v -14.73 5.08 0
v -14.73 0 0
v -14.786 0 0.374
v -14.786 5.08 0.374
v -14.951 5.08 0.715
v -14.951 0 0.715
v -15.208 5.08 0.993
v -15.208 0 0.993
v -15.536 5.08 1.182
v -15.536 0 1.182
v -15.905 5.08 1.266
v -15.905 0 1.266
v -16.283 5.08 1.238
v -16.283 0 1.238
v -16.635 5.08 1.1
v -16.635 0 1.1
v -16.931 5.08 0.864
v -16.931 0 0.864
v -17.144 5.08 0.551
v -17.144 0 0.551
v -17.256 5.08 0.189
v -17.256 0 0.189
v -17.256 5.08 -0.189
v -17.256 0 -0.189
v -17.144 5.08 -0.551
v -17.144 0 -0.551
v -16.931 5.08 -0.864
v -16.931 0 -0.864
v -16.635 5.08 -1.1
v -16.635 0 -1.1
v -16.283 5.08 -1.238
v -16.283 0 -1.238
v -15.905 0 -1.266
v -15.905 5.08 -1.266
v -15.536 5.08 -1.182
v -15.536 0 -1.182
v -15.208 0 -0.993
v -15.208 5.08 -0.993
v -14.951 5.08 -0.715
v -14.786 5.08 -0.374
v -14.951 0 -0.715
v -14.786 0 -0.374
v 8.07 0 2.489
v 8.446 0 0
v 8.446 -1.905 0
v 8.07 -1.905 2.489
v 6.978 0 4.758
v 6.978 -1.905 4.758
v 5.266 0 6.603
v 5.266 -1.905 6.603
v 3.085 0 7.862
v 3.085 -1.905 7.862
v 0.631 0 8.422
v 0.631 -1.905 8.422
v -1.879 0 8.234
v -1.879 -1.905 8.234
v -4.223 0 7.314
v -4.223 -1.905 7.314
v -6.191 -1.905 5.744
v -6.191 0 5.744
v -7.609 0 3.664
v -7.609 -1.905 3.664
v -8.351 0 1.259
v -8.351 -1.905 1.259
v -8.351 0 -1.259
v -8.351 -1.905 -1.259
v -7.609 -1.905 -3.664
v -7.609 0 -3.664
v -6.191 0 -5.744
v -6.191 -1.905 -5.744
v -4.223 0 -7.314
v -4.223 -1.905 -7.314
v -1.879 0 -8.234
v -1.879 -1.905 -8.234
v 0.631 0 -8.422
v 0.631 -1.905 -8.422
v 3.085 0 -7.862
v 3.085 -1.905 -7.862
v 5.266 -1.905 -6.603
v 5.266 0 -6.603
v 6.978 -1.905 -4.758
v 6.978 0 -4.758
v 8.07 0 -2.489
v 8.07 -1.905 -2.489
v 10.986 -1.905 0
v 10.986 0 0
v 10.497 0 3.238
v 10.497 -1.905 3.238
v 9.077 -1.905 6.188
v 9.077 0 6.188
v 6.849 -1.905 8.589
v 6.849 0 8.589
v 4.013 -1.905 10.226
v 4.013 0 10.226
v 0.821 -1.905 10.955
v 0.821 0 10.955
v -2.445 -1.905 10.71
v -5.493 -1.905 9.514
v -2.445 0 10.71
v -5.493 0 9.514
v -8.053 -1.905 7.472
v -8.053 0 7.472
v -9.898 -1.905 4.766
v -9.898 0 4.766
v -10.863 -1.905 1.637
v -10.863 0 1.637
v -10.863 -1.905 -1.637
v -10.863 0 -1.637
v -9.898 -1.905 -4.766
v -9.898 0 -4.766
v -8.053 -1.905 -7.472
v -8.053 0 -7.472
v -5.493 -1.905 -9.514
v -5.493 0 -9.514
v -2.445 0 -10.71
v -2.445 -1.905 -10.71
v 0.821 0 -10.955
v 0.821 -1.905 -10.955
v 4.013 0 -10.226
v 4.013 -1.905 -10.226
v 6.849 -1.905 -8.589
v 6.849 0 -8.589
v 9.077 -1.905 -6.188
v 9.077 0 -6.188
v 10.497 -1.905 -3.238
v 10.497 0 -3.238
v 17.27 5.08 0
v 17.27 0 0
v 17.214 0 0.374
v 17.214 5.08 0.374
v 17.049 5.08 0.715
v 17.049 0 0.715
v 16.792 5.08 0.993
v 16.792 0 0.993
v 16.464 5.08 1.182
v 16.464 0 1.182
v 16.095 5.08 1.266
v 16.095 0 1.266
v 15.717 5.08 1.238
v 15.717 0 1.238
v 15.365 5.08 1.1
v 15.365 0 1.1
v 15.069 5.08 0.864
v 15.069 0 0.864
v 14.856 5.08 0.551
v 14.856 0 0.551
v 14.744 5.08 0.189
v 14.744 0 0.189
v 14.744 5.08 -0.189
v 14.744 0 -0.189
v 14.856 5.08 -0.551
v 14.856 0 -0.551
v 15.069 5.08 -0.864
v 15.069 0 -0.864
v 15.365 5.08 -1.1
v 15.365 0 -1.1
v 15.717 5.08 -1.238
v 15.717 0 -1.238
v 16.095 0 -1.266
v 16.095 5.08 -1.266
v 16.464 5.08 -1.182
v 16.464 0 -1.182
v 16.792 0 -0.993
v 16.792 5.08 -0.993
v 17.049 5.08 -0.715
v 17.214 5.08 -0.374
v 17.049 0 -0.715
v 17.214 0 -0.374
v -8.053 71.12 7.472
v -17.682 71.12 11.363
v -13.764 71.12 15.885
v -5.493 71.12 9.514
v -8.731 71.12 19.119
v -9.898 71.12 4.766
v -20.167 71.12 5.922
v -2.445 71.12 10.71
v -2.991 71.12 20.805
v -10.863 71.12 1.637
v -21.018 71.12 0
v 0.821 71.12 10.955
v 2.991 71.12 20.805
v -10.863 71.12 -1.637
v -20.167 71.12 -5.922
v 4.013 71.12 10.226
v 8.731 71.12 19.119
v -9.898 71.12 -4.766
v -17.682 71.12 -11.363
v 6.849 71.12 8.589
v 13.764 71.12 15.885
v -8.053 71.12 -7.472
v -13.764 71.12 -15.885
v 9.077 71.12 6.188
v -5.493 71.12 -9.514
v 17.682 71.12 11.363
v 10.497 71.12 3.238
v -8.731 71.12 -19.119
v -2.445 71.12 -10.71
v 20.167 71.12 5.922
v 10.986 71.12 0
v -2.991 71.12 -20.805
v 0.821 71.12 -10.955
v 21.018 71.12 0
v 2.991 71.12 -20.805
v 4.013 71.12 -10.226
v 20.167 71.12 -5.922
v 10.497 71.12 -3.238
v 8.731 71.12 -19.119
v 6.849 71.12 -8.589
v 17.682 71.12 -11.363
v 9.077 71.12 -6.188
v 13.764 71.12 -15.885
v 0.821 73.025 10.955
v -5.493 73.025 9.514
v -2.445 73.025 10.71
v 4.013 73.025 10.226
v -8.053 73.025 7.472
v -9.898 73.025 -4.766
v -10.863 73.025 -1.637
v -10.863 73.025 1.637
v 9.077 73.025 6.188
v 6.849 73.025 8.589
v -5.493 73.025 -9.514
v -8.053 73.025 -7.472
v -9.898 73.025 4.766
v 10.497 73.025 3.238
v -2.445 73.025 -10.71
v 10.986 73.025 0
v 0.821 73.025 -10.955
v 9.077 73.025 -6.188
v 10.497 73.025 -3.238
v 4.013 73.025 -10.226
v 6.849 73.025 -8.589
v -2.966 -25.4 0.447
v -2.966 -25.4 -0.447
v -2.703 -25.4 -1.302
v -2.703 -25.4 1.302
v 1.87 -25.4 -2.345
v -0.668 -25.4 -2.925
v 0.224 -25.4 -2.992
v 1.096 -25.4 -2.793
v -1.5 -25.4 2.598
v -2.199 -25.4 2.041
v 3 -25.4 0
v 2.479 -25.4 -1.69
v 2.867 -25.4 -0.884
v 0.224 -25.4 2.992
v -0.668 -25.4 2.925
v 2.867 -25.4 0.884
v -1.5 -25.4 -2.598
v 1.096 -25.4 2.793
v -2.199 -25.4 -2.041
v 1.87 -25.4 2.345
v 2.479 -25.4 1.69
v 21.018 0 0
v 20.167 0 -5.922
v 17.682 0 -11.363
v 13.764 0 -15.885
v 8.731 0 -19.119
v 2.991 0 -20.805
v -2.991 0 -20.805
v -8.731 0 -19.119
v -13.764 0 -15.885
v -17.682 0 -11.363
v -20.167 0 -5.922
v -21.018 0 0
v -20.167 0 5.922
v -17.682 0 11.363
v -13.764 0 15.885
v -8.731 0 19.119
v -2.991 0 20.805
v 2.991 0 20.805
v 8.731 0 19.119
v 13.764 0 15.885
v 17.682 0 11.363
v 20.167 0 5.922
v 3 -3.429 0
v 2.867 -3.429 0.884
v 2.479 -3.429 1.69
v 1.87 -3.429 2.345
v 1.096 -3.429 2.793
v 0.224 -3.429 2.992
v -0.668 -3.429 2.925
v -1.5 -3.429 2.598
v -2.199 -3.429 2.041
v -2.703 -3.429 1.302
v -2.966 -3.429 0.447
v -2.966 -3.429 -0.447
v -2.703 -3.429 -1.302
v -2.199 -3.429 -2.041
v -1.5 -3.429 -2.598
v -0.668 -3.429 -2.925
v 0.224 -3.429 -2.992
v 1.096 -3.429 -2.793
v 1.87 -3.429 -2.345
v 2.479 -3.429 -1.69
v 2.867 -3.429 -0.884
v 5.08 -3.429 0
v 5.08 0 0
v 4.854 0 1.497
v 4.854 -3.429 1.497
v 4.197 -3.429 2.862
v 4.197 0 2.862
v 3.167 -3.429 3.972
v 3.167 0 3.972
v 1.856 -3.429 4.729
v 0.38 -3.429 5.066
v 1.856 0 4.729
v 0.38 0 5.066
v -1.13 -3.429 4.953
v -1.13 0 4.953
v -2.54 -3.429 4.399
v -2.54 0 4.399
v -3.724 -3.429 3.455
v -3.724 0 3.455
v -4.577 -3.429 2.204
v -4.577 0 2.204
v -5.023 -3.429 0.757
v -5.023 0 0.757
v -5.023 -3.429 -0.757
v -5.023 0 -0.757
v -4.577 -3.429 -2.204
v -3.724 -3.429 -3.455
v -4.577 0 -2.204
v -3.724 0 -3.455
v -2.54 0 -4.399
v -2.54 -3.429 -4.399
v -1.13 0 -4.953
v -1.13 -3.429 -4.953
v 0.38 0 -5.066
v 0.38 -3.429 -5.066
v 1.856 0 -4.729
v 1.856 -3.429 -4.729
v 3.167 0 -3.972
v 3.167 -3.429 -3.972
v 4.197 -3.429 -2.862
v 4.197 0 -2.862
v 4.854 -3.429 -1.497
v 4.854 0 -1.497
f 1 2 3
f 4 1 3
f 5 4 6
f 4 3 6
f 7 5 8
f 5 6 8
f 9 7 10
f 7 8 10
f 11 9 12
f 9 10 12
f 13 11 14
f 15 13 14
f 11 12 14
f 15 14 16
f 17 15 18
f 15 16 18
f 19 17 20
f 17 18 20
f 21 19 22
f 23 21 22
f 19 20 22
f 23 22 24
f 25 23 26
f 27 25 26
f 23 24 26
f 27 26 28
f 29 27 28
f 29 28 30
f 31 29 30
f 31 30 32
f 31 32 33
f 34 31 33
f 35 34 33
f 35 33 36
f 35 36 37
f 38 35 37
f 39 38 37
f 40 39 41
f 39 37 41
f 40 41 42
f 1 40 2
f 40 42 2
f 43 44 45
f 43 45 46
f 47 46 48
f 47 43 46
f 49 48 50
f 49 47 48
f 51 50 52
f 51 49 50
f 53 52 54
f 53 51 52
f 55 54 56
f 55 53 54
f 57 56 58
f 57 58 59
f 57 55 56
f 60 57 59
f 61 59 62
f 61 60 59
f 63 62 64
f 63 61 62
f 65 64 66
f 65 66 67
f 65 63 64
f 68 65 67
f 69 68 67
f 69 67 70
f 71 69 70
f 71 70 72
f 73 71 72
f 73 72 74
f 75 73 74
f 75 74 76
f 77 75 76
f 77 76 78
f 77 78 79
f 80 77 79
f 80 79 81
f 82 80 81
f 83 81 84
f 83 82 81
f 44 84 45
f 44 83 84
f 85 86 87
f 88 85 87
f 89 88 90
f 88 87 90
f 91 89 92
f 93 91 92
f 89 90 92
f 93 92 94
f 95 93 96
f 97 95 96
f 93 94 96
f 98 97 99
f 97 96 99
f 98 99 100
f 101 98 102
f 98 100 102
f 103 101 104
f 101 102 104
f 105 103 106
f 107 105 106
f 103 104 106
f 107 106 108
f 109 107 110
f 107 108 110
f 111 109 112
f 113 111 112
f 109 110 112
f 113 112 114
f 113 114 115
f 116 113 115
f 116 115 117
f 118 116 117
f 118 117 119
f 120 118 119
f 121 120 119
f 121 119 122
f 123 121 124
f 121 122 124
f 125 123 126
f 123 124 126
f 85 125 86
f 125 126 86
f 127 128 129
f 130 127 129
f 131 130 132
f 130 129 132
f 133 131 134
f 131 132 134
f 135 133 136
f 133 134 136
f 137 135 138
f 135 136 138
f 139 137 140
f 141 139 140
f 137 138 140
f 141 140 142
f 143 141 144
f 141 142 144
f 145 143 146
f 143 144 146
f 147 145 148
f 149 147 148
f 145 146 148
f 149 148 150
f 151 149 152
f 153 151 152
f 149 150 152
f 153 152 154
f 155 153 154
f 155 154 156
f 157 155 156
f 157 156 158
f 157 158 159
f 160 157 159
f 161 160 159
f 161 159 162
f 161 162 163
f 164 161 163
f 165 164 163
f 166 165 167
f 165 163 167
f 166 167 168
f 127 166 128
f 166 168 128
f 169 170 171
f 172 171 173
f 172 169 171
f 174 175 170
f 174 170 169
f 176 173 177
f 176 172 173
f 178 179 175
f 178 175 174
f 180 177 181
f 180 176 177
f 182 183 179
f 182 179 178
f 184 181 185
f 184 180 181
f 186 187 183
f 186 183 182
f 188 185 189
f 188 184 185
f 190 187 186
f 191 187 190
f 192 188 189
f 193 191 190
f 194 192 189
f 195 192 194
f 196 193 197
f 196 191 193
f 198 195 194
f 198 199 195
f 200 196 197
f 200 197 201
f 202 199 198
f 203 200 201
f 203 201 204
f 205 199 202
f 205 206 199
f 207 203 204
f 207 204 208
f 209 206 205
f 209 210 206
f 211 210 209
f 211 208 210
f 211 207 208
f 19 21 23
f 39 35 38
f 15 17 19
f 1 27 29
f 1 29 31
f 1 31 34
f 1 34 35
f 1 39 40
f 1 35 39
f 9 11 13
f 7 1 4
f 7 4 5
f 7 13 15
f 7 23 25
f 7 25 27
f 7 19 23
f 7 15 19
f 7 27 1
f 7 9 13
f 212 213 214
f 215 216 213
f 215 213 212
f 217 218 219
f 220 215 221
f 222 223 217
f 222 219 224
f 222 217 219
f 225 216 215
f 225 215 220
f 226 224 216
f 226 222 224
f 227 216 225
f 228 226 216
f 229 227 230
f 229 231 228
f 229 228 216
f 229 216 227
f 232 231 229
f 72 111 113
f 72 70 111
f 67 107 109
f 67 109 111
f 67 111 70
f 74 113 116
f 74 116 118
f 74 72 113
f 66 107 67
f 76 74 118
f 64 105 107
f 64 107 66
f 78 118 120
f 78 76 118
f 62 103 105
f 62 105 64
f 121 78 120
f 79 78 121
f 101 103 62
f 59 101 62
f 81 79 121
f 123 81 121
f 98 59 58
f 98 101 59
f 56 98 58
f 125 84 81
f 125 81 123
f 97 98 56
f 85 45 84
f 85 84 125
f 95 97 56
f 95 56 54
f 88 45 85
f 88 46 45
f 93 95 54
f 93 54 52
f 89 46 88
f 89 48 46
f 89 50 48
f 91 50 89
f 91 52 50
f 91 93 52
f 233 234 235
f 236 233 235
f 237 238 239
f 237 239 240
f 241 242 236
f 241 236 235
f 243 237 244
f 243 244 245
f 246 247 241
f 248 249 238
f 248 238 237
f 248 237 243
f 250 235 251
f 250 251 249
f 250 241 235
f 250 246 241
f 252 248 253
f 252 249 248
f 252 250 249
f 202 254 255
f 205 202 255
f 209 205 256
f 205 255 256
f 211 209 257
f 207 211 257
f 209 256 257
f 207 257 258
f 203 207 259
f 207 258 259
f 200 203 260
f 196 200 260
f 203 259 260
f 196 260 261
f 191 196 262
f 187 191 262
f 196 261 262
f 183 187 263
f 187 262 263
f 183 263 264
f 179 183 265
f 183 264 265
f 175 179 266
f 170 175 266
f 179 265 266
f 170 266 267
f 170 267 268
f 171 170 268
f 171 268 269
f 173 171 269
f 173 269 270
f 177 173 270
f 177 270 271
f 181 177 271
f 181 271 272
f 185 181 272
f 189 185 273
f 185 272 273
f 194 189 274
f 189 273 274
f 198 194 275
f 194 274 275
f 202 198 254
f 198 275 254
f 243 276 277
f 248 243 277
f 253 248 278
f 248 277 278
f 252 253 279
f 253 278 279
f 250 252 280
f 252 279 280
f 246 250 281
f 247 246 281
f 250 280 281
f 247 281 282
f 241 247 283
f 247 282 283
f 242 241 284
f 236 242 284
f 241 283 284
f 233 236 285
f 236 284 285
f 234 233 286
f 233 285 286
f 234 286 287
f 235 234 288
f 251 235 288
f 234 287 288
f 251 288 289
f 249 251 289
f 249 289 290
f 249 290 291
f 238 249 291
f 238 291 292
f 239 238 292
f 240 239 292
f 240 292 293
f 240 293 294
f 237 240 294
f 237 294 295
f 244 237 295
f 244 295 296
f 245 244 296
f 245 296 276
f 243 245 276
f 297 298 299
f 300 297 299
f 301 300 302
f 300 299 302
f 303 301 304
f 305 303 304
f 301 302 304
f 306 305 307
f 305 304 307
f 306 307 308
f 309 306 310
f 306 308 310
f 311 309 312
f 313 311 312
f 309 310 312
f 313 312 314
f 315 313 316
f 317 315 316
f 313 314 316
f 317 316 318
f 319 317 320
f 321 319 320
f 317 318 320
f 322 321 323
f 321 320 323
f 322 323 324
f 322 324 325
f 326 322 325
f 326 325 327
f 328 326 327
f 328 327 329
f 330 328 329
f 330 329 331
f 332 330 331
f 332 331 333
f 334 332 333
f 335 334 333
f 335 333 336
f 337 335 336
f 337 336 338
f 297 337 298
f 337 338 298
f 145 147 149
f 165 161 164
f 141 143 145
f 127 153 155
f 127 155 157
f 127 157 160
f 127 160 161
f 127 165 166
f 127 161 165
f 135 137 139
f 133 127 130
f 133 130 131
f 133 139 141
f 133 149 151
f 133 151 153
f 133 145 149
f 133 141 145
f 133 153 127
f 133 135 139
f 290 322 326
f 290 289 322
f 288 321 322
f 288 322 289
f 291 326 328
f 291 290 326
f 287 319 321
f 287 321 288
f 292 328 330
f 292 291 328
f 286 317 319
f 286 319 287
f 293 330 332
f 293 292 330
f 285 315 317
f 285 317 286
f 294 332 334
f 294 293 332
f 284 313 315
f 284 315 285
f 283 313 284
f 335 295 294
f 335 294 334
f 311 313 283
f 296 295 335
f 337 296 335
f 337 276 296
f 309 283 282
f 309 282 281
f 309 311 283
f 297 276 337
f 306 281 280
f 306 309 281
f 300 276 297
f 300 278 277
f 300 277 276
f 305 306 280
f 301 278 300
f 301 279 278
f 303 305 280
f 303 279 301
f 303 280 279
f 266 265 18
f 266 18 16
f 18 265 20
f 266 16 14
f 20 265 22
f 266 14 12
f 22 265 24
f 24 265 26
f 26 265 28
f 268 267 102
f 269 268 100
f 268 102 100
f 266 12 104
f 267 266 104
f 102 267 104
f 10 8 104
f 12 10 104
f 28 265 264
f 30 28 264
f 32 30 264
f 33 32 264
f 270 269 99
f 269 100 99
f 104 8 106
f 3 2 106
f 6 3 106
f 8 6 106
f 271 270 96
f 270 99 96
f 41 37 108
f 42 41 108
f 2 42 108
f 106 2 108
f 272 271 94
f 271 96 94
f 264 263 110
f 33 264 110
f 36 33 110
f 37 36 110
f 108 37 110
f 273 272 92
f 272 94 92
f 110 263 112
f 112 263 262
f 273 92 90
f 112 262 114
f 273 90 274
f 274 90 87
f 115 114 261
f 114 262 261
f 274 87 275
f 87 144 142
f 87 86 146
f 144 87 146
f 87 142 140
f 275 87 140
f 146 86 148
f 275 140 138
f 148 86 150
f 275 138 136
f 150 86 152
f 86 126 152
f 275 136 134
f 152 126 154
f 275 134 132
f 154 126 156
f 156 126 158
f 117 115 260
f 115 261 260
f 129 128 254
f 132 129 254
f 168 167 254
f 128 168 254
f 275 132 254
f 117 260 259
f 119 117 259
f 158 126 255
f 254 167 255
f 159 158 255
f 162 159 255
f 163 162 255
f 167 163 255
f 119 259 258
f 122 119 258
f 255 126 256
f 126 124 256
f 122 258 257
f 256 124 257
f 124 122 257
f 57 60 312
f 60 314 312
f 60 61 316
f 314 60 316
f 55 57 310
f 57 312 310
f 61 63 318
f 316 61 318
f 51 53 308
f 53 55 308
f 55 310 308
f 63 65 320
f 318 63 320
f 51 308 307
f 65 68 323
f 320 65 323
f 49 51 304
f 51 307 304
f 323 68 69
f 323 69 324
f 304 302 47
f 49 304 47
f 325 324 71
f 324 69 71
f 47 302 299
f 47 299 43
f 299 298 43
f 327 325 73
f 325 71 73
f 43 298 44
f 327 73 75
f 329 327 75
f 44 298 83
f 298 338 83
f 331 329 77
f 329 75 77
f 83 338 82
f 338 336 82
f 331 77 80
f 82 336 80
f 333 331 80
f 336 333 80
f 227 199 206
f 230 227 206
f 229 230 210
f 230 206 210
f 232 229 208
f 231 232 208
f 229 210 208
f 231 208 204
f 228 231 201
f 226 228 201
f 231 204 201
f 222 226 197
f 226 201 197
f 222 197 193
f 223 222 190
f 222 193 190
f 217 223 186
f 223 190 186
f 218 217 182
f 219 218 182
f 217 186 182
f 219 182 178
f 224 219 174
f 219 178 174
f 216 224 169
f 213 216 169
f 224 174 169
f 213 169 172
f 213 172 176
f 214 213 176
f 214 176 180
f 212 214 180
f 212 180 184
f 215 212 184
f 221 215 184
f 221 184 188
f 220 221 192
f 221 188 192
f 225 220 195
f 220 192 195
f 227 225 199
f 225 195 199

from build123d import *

# Parameters (mm, degrees)
SKETCH2_R           = 21.0185
BOSS_EXTRUDE1_DEPTH = 71.12
SKETCH3_R           = 10.9855
BOSS_EXTRUDE2_DEPTH = 1.905
SKETCH4_R           = 10.9855
SKETCH4_R_2         = 8.4455
BOSS_EXTRUDE3_DEPTH = 1.905
SKETCH5_R           = 3
BOSS_EXTRUDE4_DEPTH = 25.4
SKETCH6_R           = 5.08
BOSS_EXTRUDE5_DEPTH = 3.429
SKETCH7_R           = 1.27
CUT_EXTRUDE1_DEPTH  = 5.08


with BuildPart() as part:
    # Sketch2 → Boss-Extrude1 (new body)
    with BuildSketch(Plane(origin=(0, 0, 0), x_dir=(1, 0, 0), z_dir=(0, 1, 0))):
        Circle(SKETCH2_R)
    extrude(amount=BOSS_EXTRUDE1_DEPTH)

    # Sketch3 → Boss-Extrude2 (add)
    with BuildSketch(Plane(origin=(0, 71.12, 0), x_dir=(1, 0, 0), z_dir=(0, 1, 0))):
        Circle(SKETCH3_R)
    extrude(amount=BOSS_EXTRUDE2_DEPTH)

    # Sketch4 → Boss-Extrude3 (add)
    with BuildSketch(Plane.XZ):
        Circle(SKETCH4_R)
        Circle(SKETCH4_R_2, mode=Mode.SUBTRACT)
    extrude(amount=BOSS_EXTRUDE3_DEPTH)

    # Sketch5 → Boss-Extrude4 (add)
    with BuildSketch(Plane.XZ):
        Circle(SKETCH5_R)
    extrude(amount=BOSS_EXTRUDE4_DEPTH)

    # Sketch6 → Boss-Extrude5 (add)
    with BuildSketch(Plane.XZ):
        Circle(SKETCH6_R)
    extrude(amount=BOSS_EXTRUDE5_DEPTH)

    # Sketch7 → Cut-Extrude1 (cut)
    with BuildSketch(Plane.XZ):
        with Locations((16, 0)):
            Circle(SKETCH7_R)
        with Locations((-16, 0)):
            Circle(SKETCH7_R)
    extrude(amount=-CUT_EXTRUDE1_DEPTH, mode=Mode.SUBTRACT)


solid = part.part
